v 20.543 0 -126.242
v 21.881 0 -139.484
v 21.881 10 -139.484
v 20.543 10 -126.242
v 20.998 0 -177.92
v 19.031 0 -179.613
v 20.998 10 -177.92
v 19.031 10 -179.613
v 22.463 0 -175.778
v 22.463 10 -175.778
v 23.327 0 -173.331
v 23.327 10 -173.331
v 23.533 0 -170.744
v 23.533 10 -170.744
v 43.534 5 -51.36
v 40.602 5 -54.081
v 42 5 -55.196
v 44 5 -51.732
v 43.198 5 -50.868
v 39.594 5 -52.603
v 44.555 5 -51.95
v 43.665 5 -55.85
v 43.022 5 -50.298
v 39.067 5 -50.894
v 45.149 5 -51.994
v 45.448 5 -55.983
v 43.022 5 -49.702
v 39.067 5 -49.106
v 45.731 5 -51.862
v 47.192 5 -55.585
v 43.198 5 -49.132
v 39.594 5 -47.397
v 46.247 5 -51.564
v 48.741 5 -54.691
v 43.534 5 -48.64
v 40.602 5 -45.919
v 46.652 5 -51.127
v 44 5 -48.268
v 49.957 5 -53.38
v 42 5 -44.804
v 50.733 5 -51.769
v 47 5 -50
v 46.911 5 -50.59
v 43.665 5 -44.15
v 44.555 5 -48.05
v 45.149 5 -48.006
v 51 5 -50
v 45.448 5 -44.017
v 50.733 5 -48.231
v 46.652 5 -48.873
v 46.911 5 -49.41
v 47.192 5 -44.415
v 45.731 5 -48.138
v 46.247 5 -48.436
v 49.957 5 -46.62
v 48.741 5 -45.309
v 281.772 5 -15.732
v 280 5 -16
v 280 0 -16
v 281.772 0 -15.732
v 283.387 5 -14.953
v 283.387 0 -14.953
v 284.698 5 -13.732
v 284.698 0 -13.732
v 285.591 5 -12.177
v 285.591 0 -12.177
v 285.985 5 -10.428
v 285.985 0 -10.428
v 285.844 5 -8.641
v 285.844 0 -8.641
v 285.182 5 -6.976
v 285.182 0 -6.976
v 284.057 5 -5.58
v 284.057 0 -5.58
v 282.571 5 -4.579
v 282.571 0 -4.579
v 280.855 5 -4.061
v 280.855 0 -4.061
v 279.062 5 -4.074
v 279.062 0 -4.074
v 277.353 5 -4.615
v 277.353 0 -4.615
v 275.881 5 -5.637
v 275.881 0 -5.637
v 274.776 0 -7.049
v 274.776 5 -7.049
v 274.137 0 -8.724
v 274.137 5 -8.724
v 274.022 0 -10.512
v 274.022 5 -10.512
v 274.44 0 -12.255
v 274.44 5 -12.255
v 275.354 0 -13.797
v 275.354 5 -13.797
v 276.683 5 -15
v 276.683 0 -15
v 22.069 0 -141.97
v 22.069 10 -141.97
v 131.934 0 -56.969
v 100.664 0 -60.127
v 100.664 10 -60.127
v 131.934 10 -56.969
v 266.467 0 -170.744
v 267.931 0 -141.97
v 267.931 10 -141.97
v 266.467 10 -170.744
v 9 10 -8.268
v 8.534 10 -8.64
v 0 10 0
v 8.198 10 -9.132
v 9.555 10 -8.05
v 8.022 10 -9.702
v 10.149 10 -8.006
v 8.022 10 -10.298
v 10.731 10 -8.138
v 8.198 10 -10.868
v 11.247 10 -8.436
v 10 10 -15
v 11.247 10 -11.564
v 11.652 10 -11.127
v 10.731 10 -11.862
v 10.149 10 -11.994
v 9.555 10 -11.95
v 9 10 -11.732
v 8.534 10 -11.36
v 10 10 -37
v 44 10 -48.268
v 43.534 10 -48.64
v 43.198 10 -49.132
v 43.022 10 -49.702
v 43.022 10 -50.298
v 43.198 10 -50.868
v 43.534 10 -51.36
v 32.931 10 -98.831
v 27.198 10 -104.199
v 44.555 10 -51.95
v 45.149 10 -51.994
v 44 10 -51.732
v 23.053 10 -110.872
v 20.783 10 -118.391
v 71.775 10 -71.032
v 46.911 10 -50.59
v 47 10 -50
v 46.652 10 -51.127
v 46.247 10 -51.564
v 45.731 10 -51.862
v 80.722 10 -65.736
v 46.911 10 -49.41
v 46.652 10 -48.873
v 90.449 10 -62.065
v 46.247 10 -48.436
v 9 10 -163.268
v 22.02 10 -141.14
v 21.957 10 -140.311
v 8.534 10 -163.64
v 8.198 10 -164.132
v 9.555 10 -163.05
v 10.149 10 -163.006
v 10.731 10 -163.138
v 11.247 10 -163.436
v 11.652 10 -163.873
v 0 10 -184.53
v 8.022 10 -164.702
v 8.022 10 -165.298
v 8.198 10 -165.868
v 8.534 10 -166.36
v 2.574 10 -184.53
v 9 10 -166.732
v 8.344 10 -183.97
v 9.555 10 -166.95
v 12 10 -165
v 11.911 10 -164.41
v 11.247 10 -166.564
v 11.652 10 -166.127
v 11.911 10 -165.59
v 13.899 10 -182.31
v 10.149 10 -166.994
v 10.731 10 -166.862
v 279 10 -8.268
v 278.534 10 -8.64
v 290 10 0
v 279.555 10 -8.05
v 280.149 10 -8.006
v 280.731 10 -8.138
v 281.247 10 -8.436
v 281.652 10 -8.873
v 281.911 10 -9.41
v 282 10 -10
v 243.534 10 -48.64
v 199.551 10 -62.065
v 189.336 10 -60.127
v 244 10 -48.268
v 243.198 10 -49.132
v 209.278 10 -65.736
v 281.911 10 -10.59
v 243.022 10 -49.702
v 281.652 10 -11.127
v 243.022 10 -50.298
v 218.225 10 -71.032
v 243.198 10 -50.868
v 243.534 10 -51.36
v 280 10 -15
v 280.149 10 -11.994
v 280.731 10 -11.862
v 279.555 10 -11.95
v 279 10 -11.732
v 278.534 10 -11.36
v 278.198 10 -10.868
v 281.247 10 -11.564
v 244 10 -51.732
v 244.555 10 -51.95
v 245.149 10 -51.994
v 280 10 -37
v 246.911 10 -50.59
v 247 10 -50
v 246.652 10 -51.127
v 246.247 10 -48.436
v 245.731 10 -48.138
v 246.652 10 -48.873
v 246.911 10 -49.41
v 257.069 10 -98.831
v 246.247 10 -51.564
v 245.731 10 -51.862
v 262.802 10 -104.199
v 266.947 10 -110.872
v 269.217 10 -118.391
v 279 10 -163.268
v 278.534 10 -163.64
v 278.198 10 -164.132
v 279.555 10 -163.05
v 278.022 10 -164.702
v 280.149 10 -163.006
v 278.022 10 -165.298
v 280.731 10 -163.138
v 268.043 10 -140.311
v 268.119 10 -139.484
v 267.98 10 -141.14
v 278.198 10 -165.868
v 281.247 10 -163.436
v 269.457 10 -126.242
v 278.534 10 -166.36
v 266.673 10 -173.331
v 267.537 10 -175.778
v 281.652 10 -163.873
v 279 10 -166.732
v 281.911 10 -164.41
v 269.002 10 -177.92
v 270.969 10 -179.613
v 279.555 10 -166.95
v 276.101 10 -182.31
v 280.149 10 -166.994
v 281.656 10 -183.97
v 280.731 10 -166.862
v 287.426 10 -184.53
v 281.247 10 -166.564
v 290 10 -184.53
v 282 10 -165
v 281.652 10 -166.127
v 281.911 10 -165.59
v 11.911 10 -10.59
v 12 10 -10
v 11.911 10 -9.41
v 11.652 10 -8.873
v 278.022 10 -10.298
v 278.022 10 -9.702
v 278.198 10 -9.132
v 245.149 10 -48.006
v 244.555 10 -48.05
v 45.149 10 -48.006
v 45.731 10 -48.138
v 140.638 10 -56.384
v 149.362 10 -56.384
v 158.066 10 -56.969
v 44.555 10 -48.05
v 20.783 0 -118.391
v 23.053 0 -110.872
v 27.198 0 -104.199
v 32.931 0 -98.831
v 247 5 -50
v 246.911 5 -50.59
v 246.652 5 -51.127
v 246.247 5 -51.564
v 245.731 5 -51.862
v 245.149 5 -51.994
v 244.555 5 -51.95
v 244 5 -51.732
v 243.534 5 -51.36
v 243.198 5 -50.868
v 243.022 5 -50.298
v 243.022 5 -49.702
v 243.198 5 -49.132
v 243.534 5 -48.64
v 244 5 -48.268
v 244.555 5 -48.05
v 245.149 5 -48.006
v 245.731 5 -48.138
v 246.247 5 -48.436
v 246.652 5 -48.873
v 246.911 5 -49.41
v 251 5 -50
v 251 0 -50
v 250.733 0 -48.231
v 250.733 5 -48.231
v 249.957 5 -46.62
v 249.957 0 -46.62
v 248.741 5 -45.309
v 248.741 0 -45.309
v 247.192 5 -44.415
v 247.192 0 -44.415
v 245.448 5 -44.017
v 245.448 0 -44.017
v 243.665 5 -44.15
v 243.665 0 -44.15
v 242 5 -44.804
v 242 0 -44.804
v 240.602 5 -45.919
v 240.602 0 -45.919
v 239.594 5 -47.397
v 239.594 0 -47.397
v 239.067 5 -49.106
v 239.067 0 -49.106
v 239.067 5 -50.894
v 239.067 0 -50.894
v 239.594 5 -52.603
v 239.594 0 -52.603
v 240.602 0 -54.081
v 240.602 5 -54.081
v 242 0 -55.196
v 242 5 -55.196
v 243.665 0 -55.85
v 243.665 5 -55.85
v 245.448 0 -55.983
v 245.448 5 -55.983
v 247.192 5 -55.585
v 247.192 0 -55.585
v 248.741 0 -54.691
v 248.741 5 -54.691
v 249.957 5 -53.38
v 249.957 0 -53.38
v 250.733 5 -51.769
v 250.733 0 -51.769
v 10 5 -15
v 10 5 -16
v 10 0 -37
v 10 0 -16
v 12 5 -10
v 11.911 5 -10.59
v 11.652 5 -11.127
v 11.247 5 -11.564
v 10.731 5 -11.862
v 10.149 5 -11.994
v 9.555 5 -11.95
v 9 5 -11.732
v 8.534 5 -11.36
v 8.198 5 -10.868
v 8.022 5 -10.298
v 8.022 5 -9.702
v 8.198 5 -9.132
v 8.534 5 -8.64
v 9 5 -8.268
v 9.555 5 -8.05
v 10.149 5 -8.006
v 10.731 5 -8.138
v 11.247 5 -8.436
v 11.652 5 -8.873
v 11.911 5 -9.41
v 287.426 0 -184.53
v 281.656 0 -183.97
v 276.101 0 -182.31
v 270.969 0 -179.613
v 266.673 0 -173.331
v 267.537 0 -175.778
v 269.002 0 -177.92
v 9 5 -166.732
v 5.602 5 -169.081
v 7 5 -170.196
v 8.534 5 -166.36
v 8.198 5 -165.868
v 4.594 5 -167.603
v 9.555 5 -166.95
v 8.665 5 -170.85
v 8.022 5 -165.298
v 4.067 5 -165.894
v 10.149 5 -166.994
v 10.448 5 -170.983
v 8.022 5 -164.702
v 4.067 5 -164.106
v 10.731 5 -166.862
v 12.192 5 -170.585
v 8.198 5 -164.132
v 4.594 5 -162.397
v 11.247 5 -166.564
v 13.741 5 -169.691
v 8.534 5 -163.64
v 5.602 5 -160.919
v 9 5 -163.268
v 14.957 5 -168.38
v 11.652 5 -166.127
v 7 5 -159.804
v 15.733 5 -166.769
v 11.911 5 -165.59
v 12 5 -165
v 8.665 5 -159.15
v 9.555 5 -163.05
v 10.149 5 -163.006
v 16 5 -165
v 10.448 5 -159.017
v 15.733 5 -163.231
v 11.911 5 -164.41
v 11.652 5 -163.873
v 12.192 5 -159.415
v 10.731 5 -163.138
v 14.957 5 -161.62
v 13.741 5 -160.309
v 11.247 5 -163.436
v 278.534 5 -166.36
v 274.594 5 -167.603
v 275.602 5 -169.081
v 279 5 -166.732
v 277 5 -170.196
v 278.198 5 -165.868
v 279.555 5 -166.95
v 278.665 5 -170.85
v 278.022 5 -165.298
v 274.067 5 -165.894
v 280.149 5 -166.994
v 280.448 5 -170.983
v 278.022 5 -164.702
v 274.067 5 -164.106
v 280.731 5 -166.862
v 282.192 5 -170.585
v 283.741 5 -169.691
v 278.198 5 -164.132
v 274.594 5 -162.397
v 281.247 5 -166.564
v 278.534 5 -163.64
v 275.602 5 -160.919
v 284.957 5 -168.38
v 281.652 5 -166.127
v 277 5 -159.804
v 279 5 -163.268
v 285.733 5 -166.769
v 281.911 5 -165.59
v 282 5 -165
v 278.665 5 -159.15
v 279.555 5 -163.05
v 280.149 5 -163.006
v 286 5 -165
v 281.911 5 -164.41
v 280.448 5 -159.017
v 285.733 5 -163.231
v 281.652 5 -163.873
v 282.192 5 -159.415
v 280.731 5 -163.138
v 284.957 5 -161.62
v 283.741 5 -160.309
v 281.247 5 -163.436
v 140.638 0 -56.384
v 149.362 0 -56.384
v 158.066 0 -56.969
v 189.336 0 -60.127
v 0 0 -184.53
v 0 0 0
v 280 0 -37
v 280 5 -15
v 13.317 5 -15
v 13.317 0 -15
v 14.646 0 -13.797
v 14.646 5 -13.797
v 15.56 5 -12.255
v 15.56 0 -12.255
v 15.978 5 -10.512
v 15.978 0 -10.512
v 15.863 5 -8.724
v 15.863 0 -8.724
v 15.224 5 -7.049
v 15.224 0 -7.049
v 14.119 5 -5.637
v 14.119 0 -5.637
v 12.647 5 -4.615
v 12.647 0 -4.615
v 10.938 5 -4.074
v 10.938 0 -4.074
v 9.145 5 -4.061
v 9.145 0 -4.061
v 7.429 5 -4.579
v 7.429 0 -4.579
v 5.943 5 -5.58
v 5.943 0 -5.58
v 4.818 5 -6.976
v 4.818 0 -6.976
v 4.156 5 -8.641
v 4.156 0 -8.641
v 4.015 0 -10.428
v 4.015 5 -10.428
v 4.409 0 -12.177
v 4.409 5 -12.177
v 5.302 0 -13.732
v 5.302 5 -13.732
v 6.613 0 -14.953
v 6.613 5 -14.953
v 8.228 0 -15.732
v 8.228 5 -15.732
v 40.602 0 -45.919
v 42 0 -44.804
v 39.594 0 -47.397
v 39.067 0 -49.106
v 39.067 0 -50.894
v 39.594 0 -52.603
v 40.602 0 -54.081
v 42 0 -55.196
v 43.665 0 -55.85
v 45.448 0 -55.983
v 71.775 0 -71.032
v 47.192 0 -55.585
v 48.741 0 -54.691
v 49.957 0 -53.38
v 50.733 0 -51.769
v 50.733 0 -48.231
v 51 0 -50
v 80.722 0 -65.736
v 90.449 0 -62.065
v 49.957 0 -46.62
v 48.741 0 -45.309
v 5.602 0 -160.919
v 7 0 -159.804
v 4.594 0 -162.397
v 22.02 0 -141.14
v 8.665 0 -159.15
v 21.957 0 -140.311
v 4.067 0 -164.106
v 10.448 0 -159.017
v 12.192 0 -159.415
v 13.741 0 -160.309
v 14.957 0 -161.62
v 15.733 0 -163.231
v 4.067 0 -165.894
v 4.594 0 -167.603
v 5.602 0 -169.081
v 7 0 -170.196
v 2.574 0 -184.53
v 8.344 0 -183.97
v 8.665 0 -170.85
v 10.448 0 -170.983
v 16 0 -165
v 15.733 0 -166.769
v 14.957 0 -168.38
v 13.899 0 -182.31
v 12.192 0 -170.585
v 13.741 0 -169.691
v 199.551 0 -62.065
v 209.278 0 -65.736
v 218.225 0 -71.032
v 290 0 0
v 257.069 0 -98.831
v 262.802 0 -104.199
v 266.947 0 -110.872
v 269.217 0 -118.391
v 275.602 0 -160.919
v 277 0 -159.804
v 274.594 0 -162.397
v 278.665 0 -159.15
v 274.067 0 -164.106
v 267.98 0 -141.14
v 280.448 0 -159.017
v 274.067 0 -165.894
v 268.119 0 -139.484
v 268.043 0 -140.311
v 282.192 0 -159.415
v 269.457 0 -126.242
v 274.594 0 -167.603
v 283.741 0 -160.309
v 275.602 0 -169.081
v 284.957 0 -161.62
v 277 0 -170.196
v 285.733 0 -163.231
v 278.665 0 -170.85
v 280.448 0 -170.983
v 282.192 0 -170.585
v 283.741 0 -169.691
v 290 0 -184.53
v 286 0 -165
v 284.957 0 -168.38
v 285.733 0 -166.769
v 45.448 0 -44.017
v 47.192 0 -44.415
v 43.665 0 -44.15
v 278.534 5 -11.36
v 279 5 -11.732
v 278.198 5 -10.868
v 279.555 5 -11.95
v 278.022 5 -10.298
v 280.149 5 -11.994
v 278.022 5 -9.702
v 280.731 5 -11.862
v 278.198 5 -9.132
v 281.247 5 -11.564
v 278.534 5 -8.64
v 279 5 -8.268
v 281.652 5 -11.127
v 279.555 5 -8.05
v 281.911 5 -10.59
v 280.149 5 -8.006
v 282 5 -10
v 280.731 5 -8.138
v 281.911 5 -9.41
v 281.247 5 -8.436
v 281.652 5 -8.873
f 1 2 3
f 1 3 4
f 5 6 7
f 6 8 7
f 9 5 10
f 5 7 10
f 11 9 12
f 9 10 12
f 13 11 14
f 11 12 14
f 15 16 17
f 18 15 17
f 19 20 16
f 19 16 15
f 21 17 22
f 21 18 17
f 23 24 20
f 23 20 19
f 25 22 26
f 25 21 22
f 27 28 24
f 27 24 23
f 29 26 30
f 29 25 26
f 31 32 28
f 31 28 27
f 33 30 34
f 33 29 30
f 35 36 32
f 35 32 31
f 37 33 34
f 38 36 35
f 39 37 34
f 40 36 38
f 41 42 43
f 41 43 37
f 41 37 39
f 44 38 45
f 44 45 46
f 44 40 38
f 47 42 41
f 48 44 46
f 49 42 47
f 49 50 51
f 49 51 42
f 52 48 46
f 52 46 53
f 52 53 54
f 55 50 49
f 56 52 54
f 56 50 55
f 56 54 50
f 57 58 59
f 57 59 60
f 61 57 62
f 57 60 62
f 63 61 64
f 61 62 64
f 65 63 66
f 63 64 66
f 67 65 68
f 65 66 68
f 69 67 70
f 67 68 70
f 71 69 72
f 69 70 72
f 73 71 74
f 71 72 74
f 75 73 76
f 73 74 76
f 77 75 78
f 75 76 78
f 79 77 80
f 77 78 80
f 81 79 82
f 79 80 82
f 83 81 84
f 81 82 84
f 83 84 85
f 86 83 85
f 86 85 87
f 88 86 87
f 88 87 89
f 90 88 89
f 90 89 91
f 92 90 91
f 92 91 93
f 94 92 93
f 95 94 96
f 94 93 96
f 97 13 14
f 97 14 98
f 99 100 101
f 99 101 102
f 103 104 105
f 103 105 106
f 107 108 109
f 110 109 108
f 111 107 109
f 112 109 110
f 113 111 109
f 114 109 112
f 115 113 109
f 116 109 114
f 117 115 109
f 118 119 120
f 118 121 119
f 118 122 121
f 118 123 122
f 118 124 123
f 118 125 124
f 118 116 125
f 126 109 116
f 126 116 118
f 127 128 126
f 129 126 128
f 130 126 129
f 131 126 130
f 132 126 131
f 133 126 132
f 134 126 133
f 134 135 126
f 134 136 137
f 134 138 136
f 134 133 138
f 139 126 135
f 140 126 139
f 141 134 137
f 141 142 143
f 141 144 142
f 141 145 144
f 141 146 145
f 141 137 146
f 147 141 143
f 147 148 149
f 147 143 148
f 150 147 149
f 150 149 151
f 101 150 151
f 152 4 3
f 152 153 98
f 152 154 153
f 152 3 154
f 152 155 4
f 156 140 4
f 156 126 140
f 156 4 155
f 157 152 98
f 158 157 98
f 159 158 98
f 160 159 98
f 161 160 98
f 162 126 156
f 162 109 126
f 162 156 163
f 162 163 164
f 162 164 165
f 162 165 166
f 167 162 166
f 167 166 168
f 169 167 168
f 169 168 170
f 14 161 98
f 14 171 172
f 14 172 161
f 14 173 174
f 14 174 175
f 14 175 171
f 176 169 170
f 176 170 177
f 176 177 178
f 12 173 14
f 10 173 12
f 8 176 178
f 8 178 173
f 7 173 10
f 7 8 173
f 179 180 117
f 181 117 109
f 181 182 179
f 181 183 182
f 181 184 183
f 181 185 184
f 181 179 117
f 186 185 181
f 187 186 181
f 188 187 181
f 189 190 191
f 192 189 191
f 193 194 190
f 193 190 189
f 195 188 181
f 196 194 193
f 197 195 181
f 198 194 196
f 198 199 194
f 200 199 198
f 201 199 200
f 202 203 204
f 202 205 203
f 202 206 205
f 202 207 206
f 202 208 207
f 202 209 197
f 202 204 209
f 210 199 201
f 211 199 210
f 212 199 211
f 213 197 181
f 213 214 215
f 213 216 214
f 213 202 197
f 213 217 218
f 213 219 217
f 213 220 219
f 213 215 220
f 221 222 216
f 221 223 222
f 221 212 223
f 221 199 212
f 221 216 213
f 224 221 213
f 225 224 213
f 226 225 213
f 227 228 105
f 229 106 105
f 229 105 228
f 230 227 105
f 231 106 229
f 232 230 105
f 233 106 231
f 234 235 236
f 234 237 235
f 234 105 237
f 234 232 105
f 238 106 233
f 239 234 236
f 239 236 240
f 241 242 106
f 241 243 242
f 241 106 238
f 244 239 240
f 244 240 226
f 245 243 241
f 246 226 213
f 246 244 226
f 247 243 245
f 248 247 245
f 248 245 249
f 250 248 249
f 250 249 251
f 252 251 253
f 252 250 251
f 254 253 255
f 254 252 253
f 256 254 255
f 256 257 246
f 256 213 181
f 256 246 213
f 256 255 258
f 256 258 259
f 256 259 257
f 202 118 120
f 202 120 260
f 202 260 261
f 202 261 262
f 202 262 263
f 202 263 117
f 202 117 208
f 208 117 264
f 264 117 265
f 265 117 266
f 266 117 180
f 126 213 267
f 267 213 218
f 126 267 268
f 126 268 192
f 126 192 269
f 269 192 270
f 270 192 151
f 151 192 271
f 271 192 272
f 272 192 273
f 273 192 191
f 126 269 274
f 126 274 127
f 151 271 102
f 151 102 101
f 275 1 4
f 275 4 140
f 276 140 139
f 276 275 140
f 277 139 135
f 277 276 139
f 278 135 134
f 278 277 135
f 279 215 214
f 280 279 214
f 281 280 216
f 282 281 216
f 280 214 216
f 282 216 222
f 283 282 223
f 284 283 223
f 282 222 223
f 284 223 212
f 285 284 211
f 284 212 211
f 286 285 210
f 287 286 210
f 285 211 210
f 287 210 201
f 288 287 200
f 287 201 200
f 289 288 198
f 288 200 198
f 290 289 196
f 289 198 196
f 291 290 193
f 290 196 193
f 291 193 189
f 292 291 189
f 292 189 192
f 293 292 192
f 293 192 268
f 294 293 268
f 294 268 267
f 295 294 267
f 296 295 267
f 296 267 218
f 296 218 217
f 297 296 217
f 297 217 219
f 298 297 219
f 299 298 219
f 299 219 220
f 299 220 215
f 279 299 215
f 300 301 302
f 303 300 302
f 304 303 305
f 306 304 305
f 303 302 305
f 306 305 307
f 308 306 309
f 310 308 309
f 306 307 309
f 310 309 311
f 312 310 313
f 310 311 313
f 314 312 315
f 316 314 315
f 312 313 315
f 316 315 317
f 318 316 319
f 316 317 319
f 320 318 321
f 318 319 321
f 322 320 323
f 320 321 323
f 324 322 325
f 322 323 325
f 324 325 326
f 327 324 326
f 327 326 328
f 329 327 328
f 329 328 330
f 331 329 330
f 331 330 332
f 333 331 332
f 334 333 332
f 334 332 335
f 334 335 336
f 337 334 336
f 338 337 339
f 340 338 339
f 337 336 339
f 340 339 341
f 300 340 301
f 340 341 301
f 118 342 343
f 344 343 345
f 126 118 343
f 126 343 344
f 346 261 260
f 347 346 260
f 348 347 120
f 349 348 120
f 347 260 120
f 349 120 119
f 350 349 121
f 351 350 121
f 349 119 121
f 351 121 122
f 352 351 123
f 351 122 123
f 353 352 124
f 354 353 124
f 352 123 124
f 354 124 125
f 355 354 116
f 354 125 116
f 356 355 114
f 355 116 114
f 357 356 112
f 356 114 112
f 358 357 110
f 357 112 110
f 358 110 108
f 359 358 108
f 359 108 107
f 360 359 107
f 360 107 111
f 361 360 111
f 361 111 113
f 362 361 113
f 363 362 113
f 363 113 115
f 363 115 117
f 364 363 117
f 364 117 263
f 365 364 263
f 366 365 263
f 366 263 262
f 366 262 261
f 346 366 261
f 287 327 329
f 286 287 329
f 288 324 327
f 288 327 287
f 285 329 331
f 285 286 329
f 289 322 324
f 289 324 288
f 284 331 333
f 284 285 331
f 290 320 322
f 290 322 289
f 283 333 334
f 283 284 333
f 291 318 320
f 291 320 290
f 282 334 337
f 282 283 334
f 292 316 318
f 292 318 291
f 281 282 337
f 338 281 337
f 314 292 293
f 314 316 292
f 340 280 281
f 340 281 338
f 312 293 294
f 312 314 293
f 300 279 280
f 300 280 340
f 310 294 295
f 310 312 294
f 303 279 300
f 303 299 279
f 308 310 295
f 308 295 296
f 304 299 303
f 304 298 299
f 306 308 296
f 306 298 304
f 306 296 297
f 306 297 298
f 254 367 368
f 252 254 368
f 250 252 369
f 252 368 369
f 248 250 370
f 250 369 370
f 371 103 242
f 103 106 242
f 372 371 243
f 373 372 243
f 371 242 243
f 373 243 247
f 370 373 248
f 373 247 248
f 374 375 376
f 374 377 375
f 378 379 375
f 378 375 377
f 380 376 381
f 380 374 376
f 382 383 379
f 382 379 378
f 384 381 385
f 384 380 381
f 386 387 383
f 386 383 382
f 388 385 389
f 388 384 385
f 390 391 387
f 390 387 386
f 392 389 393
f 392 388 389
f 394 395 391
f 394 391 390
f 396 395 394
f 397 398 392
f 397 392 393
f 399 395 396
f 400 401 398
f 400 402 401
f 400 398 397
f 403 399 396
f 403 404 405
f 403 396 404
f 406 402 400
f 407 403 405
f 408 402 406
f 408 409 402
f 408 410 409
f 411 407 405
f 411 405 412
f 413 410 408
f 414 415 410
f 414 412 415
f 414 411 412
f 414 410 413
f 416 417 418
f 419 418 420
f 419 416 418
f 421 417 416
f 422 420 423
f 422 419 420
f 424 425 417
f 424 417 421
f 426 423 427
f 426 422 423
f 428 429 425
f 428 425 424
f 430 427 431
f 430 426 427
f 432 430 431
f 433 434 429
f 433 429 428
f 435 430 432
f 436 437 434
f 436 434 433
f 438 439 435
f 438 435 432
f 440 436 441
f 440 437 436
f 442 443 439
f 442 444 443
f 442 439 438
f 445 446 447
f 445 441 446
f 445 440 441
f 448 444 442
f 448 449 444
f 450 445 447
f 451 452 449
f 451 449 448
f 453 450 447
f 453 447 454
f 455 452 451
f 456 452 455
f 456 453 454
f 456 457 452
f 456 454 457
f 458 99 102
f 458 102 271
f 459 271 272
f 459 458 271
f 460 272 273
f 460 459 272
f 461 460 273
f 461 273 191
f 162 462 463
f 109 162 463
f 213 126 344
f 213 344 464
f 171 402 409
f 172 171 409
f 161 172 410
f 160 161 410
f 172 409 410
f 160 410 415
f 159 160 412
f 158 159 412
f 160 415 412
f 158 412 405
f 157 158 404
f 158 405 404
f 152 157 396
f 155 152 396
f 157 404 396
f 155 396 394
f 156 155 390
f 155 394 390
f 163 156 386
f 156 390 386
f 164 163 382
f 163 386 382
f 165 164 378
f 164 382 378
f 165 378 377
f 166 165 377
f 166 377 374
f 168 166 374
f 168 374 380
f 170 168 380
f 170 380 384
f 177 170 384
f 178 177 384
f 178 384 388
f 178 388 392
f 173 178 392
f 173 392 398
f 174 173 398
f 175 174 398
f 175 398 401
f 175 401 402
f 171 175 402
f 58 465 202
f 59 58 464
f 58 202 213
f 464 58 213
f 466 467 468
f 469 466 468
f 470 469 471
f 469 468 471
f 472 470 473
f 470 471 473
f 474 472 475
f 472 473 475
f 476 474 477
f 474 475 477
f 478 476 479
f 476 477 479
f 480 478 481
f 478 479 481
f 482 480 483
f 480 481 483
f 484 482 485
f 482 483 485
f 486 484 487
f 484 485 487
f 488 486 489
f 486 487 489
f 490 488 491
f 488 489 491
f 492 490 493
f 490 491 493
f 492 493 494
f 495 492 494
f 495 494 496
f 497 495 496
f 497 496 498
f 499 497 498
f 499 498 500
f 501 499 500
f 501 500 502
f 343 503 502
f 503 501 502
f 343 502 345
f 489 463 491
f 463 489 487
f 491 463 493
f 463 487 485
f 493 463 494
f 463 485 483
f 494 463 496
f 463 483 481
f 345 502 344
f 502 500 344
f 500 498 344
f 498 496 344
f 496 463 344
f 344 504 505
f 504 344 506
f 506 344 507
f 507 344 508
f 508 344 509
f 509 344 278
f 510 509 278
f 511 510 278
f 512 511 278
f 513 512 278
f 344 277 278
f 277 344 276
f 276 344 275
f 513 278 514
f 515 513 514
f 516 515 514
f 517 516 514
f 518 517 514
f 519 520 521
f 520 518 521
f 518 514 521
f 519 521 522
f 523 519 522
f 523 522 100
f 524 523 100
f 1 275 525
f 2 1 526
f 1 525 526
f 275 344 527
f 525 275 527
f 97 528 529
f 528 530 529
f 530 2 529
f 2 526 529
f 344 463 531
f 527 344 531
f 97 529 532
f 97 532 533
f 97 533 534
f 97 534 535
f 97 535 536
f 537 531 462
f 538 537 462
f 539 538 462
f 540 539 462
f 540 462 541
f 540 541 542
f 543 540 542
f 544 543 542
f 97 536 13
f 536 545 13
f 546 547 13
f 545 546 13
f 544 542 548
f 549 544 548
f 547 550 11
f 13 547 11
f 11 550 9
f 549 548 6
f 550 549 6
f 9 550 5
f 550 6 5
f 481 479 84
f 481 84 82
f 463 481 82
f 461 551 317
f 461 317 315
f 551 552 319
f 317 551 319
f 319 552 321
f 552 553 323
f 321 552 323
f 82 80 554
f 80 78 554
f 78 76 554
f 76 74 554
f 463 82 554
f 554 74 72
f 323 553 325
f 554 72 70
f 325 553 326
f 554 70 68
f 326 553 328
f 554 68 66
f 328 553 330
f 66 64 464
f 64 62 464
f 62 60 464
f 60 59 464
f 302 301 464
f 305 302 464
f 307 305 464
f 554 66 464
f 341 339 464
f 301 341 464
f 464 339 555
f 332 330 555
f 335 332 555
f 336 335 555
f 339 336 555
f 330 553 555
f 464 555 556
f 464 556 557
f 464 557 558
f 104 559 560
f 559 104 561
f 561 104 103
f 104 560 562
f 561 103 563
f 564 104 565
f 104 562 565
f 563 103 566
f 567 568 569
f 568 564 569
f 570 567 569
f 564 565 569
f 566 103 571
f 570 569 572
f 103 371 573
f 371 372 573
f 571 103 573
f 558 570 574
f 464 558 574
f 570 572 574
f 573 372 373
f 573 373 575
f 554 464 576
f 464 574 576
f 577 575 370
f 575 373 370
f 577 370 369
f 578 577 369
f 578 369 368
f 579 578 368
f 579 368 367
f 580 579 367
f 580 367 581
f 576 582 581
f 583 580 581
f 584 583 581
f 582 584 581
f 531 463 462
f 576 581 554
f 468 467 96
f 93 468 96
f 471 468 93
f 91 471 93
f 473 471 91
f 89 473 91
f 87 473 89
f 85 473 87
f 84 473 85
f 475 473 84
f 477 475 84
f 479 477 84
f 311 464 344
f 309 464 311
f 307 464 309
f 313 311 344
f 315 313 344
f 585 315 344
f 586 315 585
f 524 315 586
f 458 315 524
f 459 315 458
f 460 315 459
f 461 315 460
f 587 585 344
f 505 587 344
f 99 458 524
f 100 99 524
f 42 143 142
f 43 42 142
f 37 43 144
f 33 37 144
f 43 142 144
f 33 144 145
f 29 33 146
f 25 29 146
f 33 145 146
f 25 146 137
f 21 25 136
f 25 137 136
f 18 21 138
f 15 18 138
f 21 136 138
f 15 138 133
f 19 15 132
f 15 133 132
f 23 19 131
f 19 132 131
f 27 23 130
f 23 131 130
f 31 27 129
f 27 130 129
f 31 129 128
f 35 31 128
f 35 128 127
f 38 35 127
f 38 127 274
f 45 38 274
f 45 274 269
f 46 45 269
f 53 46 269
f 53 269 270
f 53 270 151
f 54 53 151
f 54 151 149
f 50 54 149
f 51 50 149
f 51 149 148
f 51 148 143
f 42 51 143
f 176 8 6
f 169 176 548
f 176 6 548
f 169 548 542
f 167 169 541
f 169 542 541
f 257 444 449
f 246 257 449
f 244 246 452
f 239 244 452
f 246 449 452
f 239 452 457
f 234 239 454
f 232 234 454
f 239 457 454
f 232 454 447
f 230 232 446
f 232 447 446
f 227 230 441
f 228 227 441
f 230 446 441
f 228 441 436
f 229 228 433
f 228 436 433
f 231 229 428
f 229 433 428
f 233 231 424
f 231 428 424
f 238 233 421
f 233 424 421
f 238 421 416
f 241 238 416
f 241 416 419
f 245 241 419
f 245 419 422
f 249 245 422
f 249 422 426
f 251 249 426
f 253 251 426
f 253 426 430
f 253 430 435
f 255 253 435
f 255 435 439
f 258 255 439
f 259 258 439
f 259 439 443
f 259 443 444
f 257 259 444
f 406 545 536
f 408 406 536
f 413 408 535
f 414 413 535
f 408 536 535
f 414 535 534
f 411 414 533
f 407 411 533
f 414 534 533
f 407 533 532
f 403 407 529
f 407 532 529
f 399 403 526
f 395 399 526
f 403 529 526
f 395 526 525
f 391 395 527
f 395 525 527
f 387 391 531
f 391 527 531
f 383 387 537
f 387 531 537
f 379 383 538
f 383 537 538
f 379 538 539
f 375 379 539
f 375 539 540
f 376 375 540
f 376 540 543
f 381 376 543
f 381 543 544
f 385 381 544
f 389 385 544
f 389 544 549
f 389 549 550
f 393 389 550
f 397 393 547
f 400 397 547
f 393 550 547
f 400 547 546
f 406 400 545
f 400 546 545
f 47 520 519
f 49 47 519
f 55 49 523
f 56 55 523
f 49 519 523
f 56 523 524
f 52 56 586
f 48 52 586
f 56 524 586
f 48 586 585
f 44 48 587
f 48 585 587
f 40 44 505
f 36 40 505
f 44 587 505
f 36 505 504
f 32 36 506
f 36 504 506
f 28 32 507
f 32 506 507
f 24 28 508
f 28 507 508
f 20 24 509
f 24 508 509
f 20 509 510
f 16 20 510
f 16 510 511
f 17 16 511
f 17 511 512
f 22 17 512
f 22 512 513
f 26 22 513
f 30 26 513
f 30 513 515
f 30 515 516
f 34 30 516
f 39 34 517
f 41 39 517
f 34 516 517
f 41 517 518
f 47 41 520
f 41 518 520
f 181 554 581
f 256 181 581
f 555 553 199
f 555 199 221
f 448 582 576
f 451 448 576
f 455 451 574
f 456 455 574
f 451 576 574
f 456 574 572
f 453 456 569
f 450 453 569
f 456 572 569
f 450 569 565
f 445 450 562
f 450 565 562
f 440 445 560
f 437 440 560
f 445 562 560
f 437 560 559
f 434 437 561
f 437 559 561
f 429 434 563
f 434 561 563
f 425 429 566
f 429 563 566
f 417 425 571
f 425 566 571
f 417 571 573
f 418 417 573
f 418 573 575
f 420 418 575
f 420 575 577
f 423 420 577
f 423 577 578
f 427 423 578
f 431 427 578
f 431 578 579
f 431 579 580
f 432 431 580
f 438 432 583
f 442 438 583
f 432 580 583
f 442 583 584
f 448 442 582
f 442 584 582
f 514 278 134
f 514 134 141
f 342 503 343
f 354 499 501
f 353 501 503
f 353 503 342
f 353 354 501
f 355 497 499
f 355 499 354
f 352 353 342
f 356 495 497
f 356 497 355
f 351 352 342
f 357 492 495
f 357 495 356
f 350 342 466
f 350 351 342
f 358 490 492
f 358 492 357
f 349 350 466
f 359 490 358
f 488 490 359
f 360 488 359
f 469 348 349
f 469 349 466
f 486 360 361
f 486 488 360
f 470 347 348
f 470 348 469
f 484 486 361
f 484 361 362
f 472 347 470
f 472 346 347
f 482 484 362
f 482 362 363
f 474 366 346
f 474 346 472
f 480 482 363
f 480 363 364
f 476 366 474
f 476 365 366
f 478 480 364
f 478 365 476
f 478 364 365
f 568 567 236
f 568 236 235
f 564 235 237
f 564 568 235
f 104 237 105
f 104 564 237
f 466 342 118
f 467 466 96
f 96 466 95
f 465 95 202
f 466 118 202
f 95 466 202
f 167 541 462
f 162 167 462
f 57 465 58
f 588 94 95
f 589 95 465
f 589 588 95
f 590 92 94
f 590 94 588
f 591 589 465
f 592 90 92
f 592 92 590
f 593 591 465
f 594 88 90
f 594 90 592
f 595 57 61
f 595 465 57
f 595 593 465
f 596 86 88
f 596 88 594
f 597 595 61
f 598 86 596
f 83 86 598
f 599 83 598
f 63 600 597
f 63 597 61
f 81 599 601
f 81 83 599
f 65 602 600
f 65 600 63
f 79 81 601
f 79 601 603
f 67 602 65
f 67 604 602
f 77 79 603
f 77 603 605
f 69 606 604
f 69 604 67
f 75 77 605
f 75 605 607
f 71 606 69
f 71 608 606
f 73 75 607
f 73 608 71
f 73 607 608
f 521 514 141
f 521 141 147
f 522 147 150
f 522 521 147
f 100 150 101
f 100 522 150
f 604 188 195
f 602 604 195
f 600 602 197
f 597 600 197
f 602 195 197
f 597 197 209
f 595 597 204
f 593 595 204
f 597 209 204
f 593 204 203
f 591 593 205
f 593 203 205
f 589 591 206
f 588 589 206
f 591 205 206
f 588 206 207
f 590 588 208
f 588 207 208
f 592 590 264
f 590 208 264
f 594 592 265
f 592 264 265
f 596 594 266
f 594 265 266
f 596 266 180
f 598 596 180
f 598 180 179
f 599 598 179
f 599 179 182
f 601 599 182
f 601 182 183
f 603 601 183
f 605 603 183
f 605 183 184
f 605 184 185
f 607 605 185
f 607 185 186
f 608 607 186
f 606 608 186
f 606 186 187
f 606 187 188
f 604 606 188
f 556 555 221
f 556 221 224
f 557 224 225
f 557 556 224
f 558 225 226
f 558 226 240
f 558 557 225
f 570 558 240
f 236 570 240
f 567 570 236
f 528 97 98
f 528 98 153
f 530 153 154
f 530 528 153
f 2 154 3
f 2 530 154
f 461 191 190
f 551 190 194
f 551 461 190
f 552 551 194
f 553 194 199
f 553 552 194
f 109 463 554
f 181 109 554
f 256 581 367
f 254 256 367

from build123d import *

# Parameters (mm, degrees)
BOSS_EXTRU_1_DEPTH       = 10
ESQUISSE3_R              = 2
ENL_V_MAT_EXTRU_1_DEPTH  = 10
ESQUISSE6_W              = 270
ESQUISSE6_H              = 22
ENL_V_MAT_EXTRU_4_DEPTH  = 10
ESQUISSE9_R              = 2
ENL_V_MAT_EXTRU_7_DEPTH  = 10
ENL_V_MAT_EXTRU_9_DEPTH  = 10
CONG_5_R                 = 10
ESQUISSE12_R             = 2
ENL_V_MAT_EXTRU_10_DEPTH = 10
ESQUISSE14_R             = 6
ENL_V_MAT_EXTRU_11_DEPTH = 5


with BuildPart() as part:
    # Esquisse2 → Boss.-Extru.1 (new body)
    with BuildSketch(Plane(origin=(0, 0, 0), x_dir=(1, 0, 0), z_dir=(0, 1, 0))):
        with BuildLine():
            Line((0, 0), (290, 0))
            Line((290, 0), (290, 184.53))
            Line((290, 184.53), (287.426406871, 184.53))
            ThreePointArc((287.426406871, 184.53), (275.9459039, 182.246385975), (266.213203436, 175.743203436))
            Line((266.213203436, 175.743203436), (180.47, 90))
            Line((180.47, 90), (109.53, 90))
            Line((109.53, 90), (23.786796564, 175.743203436))
            ThreePointArc((23.786796564, 175.743203436), (14.0540961, 182.246385975), (2.573593129, 184.53))
            Line((2.573593129, 184.53), (0, 184.53))
            Line((0, 184.53), (0, 0))
        make_face()
    extrude(amount=BOSS_EXTRU_1_DEPTH)

    # Esquisse3 → Enlèv. mat.-Extru.1 (cut)
    with BuildSketch(Plane(origin=(0, 10, 0), x_dir=(1, 0, 0), z_dir=(0, 1, 0))):
        with Locations((10, 10)):
            Circle(ESQUISSE3_R)
        with Locations((280, 10)):
            Circle(ESQUISSE3_R)
    extrude(amount=-ENL_V_MAT_EXTRU_1_DEPTH, mode=Mode.SUBTRACT)

    # Esquisse6 → Enlèv. mat.-Extru.4 (cut)
    with BuildSketch(Plane(origin=(0, 10, 0), x_dir=(1, 0, 0), z_dir=(0, 1, 0))):
        with Locations((145, 26)):
            Rectangle(ESQUISSE6_W, ESQUISSE6_H)
    extrude(amount=-ENL_V_MAT_EXTRU_4_DEPTH, mode=Mode.SUBTRACT)

    # Esquisse9 → Enlèv. mat.-Extru.7 (cut)
    with BuildSketch(Plane(origin=(0, 10, 0), x_dir=(1, 0, 0), z_dir=(0, 1, 0))):
        with Locations((45, 50)):
            Circle(ESQUISSE9_R)
        with Locations((245, 50)):
            Circle(ESQUISSE9_R)
    extrude(amount=-ENL_V_MAT_EXTRU_7_DEPTH, mode=Mode.SUBTRACT)

    # Esquisse11 → Enlèv. mat.-Extru.9 (cut)
    with BuildSketch(Plane.XZ):
        with BuildLine():
            Line((23.786796564, -175.743203436), (22.069258887, -141.969600166))
            ThreePointArc((22.069258887, -141.969600166), (21.990433689, -140.725538115), (21.88061952, -139.483827743))
            Line((21.88061952, -139.483827743), (20.54302042, -126.242335439))
            ThreePointArc((20.54302042, -126.242335439), (23.053468491, -110.871931551), (32.931464028, -98.831297457))
            Line((32.931464028, -98.831297457), (71.774958897, -71.031800705))
            ThreePointArc((71.774958897, -71.031800705), (85.505992048, -63.689345624), (100.664013996, -60.127423581))
            Line((100.664013996, -60.127423581), (131.934446663, -56.968617789))
            ThreePointArc((131.934446663, -56.968617789), (145, -56.310379475), (158.065553337, -56.968617789))
            Line((158.065553337, -56.968617789), (189.335986004, -60.127423581))
            ThreePointArc((189.335986004, -60.127423581), (204.494007952, -63.689345624), (218.225041103, -71.031800705))
            Line((218.225041103, -71.031800705), (257.068535972, -98.831297457))
            ThreePointArc((257.068535972, -98.831297457), (266.946531509, -110.871931551), (269.45697958, -126.242335439))
            Line((269.45697958, -126.242335439), (268.11938048, -139.483827743))
            ThreePointArc((268.11938048, -139.483827743), (268.009566311, -140.725538115), (267.930741113, -141.969600166))
            Line((267.930741113, -141.969600166), (266.213203436, -175.743203436))
            Line((266.213203436, -175.743203436), (23.786796564, -175.743203436))
        make_face()
    extrude(amount=-ENL_V_MAT_EXTRU_9_DEPTH, mode=Mode.SUBTRACT)

    # Congé5
    cong_5_edges = [part.edges().sort_by_distance(p)[0] for p in [
        (23.786796564, 5, -175.743203436),
        (266.213203436, 5, -175.743203436),
    ]]
    fillet(cong_5_edges, radius=CONG_5_R)

    # Esquisse12 → Enlèv. mat.-Extru.10 (cut)
    with BuildSketch(Plane.XZ):
        with Locations((10, -165)):
            Circle(ESQUISSE12_R)
        with Locations((280, -165)):
            Circle(ESQUISSE12_R)
    extrude(amount=-ENL_V_MAT_EXTRU_10_DEPTH, mode=Mode.SUBTRACT)

    # Esquisse14 → Enlèv. mat.-Extru.11 (cut)
    with BuildSketch(Plane.XZ):
        with Locations((10, -10)):
            Circle(ESQUISSE14_R)
        with Locations((45, -50)):
            Circle(ESQUISSE14_R)
        with Locations((10, -165)):
            Circle(ESQUISSE14_R)
        with Locations((280, -165)):
            Circle(ESQUISSE14_R)
        with Locations((245, -50)):
            Circle(ESQUISSE14_R)
        with Locations((280, -10)):
            Circle(ESQUISSE14_R)
    extrude(amount=-ENL_V_MAT_EXTRU_11_DEPTH, mode=Mode.SUBTRACT)


solid = part.part
